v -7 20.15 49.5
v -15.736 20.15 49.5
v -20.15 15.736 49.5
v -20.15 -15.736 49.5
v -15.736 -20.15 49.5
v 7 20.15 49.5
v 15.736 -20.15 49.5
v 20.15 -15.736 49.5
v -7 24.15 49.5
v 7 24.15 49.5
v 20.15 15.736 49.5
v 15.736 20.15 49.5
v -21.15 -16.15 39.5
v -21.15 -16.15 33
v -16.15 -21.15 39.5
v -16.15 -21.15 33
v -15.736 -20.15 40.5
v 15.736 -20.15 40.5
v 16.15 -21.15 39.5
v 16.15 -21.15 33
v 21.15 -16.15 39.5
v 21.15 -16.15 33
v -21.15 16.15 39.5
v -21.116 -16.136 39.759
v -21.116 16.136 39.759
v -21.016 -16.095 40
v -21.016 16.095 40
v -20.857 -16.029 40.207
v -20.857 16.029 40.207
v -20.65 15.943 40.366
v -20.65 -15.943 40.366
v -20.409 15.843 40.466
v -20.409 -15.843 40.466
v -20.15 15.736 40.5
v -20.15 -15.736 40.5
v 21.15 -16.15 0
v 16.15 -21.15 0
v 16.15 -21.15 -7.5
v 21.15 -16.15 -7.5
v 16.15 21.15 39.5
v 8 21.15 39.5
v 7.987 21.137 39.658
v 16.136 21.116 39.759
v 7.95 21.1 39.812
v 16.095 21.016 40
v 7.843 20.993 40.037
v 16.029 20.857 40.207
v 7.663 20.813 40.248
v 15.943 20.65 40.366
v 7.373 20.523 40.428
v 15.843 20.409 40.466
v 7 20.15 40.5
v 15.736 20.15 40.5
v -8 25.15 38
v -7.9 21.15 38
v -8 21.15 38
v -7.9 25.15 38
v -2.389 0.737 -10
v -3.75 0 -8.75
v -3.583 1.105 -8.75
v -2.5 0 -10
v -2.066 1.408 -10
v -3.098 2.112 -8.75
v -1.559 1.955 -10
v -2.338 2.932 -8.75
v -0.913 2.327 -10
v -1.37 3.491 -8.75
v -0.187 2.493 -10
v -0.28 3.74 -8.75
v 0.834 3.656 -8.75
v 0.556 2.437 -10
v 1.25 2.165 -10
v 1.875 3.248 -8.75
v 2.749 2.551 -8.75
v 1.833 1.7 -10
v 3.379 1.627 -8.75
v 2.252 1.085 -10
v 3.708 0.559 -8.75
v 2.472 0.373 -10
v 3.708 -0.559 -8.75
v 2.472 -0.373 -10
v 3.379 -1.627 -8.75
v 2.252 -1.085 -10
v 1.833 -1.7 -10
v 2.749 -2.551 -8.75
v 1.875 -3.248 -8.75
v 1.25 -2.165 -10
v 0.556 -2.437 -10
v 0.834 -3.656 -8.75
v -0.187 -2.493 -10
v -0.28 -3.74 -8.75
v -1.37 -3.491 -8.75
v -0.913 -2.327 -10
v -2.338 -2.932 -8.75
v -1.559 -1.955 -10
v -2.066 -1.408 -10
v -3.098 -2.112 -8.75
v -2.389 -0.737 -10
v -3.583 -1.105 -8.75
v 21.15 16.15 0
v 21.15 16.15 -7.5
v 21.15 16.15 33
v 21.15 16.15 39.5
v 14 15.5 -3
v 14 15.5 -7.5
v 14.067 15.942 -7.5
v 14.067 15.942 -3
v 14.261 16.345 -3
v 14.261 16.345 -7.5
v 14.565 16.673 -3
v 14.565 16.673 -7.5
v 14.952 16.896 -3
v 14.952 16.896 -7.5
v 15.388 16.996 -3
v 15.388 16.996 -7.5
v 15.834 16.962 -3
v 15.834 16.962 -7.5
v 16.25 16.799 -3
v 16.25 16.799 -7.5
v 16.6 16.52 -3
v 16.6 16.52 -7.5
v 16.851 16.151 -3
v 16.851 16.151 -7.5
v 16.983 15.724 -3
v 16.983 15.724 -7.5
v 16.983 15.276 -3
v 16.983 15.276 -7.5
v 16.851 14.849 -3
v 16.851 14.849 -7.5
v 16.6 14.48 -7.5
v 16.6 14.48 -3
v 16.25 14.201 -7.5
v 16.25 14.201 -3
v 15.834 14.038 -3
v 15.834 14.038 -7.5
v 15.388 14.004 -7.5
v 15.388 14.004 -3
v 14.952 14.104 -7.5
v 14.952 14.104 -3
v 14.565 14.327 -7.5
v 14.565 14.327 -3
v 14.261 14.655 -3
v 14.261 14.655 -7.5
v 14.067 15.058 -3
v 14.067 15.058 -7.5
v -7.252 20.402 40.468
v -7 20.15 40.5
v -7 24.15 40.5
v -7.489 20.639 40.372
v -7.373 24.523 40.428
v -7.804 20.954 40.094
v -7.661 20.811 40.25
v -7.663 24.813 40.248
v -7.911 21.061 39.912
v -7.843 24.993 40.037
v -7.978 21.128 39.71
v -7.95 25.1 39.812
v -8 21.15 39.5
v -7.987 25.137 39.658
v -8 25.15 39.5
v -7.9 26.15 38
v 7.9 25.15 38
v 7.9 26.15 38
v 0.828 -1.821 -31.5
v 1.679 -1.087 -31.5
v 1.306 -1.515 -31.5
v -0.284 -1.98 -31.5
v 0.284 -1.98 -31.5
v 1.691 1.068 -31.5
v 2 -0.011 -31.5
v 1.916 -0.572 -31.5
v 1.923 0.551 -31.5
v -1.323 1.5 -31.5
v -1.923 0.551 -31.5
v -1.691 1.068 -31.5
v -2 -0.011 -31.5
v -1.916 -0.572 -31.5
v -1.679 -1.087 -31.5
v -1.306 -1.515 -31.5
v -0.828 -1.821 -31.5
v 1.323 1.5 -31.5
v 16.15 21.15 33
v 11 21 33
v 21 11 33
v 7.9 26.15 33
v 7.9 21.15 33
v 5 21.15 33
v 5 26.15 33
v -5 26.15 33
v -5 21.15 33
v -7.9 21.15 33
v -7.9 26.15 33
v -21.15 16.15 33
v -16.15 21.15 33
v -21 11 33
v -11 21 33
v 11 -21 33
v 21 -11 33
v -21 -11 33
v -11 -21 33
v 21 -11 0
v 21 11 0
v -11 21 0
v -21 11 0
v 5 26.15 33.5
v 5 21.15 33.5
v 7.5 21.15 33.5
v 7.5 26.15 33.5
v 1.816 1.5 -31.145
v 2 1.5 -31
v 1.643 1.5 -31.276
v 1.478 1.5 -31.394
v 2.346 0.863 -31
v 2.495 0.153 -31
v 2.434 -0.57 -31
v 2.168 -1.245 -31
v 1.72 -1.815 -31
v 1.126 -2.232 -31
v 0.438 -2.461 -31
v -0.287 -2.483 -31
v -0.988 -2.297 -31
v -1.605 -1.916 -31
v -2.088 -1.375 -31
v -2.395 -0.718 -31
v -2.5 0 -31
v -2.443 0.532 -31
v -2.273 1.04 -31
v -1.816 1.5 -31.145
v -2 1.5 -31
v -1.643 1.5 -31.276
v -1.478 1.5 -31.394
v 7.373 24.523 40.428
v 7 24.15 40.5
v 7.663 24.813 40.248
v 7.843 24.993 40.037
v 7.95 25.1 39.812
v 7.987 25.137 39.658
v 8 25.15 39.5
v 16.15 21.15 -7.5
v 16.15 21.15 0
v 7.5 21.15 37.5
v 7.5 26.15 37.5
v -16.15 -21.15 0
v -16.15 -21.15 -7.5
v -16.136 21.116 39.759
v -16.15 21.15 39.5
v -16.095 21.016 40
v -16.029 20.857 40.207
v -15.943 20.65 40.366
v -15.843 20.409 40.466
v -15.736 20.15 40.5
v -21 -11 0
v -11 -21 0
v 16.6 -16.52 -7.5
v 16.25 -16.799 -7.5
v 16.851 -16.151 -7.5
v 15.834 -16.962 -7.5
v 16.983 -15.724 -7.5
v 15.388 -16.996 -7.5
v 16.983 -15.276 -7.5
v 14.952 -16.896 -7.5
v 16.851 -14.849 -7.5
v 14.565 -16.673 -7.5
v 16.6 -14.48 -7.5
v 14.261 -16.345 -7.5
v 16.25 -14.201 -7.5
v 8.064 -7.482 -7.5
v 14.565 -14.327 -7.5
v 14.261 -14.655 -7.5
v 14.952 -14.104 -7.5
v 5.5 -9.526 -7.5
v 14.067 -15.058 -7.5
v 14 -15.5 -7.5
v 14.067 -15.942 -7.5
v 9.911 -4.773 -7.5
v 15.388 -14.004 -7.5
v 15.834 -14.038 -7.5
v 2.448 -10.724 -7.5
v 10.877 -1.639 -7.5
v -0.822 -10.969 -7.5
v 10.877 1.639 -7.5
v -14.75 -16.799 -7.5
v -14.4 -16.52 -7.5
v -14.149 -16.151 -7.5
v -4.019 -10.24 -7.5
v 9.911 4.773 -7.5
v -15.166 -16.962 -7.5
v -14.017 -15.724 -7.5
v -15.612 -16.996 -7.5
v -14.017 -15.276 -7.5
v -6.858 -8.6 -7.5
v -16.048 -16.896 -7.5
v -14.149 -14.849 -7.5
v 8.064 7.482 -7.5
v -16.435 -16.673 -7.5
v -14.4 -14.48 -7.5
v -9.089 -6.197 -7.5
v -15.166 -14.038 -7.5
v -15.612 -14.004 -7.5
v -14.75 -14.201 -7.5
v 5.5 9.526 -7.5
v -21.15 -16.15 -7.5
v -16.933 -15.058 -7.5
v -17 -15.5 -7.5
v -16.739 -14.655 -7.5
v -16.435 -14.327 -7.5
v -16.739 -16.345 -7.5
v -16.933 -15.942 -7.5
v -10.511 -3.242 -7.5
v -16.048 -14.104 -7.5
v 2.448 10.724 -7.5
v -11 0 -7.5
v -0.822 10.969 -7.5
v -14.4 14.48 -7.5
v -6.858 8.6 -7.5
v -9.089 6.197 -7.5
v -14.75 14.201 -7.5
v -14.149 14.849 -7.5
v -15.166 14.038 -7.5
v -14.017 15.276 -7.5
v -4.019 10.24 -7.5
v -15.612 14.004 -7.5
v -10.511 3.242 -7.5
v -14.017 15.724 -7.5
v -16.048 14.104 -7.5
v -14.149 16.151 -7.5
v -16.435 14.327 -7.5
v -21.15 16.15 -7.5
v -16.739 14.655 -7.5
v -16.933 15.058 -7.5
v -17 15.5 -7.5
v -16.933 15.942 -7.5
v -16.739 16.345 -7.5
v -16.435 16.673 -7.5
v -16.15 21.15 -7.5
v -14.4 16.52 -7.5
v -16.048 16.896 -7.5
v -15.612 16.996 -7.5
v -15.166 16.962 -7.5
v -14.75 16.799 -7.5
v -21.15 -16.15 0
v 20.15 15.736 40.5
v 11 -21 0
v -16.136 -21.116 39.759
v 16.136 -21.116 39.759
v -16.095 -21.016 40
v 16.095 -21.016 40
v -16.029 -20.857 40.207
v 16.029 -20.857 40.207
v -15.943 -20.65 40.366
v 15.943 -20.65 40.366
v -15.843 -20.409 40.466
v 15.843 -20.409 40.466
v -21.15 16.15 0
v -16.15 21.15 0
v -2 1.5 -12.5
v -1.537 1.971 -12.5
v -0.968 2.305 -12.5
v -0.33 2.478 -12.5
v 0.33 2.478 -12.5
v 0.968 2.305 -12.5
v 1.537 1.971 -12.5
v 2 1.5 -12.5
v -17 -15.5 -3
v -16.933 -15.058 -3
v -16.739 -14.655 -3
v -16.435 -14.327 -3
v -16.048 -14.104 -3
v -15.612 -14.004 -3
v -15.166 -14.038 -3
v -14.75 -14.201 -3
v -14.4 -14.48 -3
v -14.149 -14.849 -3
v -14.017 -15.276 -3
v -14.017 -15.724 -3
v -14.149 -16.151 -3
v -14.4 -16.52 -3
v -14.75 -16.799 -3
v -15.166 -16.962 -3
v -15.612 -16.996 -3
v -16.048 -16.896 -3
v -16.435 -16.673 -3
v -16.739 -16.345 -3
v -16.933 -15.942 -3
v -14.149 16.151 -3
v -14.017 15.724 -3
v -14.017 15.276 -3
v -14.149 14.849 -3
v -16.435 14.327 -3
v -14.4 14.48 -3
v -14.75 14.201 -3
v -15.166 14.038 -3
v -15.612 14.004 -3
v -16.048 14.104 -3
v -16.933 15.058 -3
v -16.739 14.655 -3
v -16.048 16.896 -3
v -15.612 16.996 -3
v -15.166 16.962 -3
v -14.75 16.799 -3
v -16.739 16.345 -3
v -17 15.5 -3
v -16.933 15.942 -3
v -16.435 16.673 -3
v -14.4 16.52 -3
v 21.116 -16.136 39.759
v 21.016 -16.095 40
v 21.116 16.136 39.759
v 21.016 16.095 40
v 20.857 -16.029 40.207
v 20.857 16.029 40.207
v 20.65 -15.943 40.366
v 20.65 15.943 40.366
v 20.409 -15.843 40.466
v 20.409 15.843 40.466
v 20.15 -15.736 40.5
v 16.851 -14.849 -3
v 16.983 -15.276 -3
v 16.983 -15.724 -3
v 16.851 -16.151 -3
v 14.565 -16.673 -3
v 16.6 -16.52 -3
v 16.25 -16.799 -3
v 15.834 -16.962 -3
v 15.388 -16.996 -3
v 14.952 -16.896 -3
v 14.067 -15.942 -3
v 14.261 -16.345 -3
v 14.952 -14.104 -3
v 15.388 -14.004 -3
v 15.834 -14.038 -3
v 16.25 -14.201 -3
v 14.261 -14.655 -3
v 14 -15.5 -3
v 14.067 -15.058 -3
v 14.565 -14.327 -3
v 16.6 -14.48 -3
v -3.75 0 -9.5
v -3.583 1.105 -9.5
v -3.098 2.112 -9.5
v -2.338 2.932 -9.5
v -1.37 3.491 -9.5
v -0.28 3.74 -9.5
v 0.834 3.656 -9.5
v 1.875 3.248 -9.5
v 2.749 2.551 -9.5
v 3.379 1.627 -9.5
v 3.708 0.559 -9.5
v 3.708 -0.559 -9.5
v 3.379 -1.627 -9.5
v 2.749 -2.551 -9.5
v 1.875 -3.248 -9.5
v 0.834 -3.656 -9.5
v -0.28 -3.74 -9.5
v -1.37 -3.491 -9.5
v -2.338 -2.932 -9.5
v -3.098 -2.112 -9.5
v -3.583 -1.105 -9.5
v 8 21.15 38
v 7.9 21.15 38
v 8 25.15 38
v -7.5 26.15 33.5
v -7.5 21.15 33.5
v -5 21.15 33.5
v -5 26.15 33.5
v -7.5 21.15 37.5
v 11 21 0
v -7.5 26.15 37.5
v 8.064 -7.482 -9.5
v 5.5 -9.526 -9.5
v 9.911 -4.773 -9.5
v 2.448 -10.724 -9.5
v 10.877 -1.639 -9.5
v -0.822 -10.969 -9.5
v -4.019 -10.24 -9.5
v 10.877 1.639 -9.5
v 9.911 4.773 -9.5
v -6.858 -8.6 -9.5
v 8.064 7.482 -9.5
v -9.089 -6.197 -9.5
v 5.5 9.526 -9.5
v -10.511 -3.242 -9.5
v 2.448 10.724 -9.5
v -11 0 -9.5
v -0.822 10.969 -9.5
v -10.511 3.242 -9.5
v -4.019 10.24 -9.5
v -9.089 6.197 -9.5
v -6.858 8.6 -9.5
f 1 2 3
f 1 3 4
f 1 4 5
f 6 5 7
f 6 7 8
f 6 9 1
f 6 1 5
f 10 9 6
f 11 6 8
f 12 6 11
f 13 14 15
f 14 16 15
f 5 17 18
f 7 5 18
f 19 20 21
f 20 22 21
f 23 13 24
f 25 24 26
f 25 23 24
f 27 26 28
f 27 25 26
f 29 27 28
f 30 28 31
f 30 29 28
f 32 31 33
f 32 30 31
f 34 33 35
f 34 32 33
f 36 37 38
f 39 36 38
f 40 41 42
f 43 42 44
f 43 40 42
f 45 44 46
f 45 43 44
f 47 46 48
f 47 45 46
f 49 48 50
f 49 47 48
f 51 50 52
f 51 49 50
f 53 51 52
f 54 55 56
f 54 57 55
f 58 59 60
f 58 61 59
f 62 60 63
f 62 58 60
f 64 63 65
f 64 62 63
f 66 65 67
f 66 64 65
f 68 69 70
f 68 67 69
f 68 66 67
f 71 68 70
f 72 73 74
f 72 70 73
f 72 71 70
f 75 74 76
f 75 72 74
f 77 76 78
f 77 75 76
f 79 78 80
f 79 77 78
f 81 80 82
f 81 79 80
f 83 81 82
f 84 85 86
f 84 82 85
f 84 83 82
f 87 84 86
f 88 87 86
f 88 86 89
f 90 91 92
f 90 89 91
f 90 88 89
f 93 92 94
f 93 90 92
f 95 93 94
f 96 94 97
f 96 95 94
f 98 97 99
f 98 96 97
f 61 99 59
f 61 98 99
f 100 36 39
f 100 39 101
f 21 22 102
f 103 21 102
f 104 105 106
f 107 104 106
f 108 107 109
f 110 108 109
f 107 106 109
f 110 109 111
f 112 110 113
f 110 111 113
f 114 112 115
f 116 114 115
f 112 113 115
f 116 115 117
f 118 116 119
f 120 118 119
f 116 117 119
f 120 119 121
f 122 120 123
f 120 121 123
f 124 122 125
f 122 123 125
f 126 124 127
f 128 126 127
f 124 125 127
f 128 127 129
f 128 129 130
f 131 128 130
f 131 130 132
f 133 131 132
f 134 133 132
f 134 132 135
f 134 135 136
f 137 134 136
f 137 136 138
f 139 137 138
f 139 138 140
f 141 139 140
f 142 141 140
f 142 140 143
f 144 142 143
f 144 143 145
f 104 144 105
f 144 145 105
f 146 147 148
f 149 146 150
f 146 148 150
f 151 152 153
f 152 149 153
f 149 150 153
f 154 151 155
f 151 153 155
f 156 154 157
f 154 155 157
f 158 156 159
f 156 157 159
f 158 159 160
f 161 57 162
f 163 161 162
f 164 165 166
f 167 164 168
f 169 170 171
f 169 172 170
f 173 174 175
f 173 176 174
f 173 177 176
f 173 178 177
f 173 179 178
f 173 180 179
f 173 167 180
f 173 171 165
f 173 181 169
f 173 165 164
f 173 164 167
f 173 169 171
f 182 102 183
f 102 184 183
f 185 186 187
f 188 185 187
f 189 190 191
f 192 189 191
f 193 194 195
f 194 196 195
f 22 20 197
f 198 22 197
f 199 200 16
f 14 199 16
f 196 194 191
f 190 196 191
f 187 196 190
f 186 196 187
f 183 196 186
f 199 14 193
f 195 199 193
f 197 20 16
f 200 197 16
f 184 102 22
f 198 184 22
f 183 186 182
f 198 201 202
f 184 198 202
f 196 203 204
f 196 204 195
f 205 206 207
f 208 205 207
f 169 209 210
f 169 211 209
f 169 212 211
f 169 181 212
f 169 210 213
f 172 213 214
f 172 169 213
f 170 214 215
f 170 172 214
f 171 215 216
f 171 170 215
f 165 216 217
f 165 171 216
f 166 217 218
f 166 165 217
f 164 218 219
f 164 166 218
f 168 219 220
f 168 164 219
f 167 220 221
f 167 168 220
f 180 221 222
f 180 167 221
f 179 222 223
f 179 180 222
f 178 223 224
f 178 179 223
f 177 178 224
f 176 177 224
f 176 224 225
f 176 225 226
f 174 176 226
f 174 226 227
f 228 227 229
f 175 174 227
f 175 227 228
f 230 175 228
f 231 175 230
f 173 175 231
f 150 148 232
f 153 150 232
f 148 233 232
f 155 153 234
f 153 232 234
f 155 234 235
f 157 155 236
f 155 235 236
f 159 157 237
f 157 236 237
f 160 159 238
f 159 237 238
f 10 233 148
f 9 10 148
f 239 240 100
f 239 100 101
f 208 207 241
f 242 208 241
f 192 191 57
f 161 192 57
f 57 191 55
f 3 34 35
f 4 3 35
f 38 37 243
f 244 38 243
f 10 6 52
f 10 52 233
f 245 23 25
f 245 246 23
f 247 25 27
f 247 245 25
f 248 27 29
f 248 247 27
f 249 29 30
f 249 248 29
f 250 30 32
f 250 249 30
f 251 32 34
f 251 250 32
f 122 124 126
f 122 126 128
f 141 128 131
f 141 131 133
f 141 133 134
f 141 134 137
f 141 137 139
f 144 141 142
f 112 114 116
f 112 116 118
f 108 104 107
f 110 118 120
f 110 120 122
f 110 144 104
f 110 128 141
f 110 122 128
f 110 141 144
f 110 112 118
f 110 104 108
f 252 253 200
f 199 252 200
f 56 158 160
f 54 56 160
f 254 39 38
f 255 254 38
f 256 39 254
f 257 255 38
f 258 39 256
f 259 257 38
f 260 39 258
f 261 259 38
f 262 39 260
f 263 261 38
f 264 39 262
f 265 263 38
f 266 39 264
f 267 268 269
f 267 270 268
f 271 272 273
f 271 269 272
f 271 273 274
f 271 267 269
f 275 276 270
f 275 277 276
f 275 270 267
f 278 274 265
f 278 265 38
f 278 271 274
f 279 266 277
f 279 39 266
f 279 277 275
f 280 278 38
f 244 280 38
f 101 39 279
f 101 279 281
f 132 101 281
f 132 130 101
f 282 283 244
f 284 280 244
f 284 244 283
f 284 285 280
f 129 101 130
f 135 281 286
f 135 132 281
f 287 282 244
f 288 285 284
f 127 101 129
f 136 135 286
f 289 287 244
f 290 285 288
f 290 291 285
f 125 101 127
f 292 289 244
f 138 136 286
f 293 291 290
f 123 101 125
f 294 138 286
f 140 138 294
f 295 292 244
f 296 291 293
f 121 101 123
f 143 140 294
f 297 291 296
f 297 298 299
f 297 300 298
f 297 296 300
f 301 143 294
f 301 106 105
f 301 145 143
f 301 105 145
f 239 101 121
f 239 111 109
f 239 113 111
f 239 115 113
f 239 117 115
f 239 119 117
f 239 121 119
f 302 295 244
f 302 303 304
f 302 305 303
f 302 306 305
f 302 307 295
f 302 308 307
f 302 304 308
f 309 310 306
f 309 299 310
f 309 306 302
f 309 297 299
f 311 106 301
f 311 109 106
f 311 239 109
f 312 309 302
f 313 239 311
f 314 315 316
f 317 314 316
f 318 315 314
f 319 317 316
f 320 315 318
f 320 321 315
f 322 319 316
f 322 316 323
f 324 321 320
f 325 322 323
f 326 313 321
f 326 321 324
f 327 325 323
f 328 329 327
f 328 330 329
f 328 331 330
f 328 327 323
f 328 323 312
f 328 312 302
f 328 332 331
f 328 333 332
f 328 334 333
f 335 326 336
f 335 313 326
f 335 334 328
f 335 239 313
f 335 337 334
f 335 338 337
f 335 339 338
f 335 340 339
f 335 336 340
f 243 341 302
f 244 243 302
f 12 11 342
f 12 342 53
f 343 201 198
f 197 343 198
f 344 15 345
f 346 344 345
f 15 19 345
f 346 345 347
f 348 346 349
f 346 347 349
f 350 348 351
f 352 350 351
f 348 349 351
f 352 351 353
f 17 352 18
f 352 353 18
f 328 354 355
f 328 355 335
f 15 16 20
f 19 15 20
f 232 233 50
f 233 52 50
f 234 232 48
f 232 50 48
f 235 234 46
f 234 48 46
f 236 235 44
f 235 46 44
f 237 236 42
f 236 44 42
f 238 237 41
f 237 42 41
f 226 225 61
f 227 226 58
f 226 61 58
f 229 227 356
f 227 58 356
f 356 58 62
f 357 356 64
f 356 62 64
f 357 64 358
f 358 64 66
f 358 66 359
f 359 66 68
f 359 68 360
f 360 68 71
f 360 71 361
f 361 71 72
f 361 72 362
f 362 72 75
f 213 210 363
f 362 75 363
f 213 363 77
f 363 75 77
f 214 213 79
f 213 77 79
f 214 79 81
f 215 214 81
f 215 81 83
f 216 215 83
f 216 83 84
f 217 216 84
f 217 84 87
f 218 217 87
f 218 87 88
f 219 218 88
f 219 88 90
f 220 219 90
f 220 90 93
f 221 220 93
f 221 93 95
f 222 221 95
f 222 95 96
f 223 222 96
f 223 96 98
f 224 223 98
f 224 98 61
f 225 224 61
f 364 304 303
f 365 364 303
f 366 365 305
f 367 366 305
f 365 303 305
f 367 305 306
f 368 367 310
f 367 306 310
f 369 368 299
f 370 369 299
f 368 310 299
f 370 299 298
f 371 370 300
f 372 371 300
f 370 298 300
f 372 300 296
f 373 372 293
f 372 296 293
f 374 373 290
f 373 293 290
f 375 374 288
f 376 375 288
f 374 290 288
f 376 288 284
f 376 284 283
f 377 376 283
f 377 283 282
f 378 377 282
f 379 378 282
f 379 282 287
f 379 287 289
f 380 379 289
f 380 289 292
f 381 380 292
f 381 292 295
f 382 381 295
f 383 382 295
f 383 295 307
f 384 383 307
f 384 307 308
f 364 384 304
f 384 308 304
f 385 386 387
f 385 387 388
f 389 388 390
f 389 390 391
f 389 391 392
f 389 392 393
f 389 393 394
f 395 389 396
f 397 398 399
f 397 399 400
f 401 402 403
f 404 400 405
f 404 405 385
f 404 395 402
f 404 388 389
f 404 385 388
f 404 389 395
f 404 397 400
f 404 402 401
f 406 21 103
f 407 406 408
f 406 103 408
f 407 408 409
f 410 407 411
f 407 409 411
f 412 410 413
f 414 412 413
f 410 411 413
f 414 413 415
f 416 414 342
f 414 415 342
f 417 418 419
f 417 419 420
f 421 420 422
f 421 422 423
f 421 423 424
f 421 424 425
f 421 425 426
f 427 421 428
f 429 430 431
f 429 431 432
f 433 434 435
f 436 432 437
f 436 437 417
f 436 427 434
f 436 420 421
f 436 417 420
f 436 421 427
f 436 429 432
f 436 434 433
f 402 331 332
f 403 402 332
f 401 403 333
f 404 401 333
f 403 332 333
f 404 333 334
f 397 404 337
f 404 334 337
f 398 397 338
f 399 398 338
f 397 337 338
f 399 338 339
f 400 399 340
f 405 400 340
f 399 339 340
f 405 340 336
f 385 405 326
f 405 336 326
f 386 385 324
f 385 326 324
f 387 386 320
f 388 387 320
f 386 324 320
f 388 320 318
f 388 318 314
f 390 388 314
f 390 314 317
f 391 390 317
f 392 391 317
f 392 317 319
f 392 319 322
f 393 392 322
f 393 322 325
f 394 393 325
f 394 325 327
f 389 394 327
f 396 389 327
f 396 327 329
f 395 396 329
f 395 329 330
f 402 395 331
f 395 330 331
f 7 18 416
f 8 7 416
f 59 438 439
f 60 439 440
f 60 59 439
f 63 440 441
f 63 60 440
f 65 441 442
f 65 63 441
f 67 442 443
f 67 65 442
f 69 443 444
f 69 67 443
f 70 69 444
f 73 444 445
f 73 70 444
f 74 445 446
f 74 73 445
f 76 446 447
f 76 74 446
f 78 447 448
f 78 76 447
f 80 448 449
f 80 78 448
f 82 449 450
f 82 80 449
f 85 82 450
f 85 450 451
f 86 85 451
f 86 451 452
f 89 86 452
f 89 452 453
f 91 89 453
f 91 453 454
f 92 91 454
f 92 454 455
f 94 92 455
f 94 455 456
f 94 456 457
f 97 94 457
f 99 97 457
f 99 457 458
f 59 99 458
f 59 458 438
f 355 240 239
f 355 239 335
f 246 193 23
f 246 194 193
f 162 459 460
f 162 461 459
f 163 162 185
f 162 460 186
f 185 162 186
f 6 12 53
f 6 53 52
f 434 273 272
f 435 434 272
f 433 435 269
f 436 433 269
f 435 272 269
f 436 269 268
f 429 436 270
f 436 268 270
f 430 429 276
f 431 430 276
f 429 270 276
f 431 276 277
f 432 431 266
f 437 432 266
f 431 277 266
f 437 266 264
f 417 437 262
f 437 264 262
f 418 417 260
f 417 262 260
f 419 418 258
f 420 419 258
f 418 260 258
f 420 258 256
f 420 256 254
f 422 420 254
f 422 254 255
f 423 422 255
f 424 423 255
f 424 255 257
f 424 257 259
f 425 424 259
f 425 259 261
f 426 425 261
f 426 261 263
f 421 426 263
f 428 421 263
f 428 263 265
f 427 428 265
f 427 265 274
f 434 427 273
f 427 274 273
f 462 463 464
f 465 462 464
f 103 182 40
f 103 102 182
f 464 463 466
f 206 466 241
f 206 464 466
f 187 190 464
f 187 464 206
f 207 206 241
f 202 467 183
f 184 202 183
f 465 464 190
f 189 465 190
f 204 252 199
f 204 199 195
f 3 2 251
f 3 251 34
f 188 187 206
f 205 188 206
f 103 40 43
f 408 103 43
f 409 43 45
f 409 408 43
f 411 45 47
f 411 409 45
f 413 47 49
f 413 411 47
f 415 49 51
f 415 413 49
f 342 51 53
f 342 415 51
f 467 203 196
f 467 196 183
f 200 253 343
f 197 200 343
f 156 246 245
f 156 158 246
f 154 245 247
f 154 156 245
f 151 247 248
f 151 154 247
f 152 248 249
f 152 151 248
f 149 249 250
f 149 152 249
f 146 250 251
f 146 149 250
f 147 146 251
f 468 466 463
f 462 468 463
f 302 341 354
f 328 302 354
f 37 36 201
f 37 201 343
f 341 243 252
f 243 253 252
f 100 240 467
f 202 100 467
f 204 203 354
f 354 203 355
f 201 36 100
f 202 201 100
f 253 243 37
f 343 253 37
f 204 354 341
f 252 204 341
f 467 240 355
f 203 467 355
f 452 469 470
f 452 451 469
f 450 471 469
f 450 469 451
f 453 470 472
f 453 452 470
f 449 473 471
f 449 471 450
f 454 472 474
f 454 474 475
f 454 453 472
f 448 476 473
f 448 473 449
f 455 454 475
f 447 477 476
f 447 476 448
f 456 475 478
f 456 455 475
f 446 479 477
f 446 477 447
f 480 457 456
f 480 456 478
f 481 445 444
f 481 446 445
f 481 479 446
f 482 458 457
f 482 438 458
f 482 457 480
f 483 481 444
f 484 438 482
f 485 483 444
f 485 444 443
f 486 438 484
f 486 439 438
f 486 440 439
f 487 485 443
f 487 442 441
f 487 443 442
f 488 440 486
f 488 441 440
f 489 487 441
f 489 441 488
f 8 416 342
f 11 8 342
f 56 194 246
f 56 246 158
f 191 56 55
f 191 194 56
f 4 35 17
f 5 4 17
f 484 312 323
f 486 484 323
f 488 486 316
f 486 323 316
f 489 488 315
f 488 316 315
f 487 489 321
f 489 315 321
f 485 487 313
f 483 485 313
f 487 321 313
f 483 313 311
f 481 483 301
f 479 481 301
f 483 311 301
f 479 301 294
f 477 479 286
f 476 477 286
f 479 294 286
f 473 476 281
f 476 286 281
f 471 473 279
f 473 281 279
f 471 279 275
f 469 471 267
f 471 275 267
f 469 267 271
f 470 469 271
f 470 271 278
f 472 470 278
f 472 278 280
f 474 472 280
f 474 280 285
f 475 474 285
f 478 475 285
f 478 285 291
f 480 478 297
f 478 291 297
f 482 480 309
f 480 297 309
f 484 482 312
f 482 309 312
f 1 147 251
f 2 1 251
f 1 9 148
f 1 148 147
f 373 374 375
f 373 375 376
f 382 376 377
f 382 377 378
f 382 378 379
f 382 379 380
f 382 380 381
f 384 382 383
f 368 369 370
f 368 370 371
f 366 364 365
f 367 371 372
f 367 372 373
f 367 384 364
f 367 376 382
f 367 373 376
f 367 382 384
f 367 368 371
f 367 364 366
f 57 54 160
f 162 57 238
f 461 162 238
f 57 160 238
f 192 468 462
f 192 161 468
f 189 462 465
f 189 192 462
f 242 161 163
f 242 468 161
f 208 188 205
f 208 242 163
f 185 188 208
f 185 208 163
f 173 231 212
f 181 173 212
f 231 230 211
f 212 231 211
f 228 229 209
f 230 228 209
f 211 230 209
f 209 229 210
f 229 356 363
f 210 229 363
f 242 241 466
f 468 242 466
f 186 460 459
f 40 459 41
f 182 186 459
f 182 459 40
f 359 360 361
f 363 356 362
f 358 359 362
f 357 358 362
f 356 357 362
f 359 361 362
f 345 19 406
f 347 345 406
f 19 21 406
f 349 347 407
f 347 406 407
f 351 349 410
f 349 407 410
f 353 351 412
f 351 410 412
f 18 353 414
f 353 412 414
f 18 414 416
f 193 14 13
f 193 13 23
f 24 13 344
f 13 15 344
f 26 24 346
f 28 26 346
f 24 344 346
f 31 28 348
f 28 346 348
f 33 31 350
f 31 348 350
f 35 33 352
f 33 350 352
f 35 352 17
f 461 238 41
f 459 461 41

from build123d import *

# Parameters (mm, degrees)
SKETCH_1_W          = 42
SKETCH_1_H          = 42
EXTRUDE_1_DEPTH     = 33
CHAMFER_1_SIZE      = 10
SKETCH_2_W          = 42.3
SKETCH_2_H          = 42.3
EXTRUDE_2_DEPTH     = 7.5
SKETCH_3_W          = 42.3
SKETCH_3_H          = 42.3
EXTRUDE_3_DEPTH     = 7.5
CHAMFER_2_SIZE      = 5
SKETCH_4_R          = 1.5
CUT_EXTRUDE_1_DEPTH = 4.5
SKETCH_5_R          = 11
SKETCH_5_R_2        = 3.75
EXTRUDE_4_DEPTH     = 2
SKETCH_6_R          = 2.5
EXTRUDE_5_DEPTH     = 24
CUT_EXTRUDE_START   = -19
CUT_EXTRUDE_2_DEPTH = 19
CHAMFER_3_SIZE      = 0.5
EXTRUDE_6_DEPTH     = 2.5
FILLET_1_R          = 1
EXTRUDE_7_DEPTH     = 5
EXTRUDE_8_DEPTH     = 9
CHAMFER_4_SIZE      = 2.5


with BuildPart() as part:
    # 草图1 → 凸台-拉伸1 (new body)
    with BuildSketch(Plane.XY):
        Rectangle(SKETCH_1_W, SKETCH_1_H)
    extrude(amount=EXTRUDE_1_DEPTH)

    # 倒角1
    chamfer_1_edges = [part.edges().sort_by_distance(p)[0] for p in [
        (21, -21, 16.5),
        (-21, -21, 16.5),
        (-21, 21, 16.5),
        (21, 21, 16.5),
    ]]
    chamfer(chamfer_1_edges, length=CHAMFER_1_SIZE)

    # 草图2 → 凸台-拉伸2 (add)
    with BuildSketch(Plane.XY.offset(33)):
        Rectangle(SKETCH_2_W, SKETCH_2_H)
    extrude(amount=EXTRUDE_2_DEPTH)

    # 草图3 → 凸台-拉伸3 (add)
    with BuildSketch(Plane(origin=(0, 0, 0), x_dir=(-1, 0, 0), z_dir=(0, 0, -1))):
        Rectangle(SKETCH_3_W, SKETCH_3_H)
    extrude(amount=EXTRUDE_3_DEPTH)

    # 倒角2
    chamfer_2_edges = [part.edges().sort_by_distance(p)[0] for p in [
        (21.15, -21.15, 36.75),
        (21.15, 21.15, 36.75),
        (-21.15, 21.15, 36.75),
        (-21.15, -21.15, 36.75),
        (-21.15, -21.15, -3.75),
        (-21.15, 21.15, -3.75),
        (21.15, 21.15, -3.75),
        (21.15, -21.15, -3.75),
    ]]
    chamfer(chamfer_2_edges, length=CHAMFER_2_SIZE)

    # 草图4 → 切除-拉伸1 (cut)
    with BuildSketch(Plane(origin=(0, 0, -7.5), x_dir=(-1, 0, 0), z_dir=(0, 0, -1))):
        with Locations((-15.5, 15.5)):
            Circle(SKETCH_4_R)
        with Locations((15.5, 15.5)):
            Circle(SKETCH_4_R)
        with Locations((15.5, -15.5)):
            Circle(SKETCH_4_R)
        with Locations((-15.5, -15.5)):
            Circle(SKETCH_4_R)
    extrude(amount=-CUT_EXTRUDE_1_DEPTH, mode=Mode.SUBTRACT)

    # 草图5 → 凸台-拉伸4 (add)
    with BuildSketch(Plane(origin=(0, 0, -7.5), x_dir=(-1, 0, 0), z_dir=(0, 0, -1))):
        Circle(SKETCH_5_R)
        Circle(SKETCH_5_R_2, mode=Mode.SUBTRACT)
    extrude(amount=EXTRUDE_4_DEPTH)

    # 草图6 → 凸台-拉伸5 (add)
    with BuildSketch(Plane(origin=(0, 0, -7.5), x_dir=(-1, 0, 0), z_dir=(0, 0, -1))):
        Circle(SKETCH_6_R)
    extrude(amount=EXTRUDE_5_DEPTH)

    # 草图7 → 切除-拉伸2 (cut)
    with BuildSketch(Plane(origin=(0, 0, -31.5), x_dir=(-1, 0, 0), z_dir=(0, 0, -1)).offset(CUT_EXTRUDE_START)):
        with BuildLine():
            Line((2, 1.5), (-2, 1.5))
            ThreePointArc((-2, 1.5), (0, 2.5), (2, 1.5))
        make_face()
    extrude(amount=CUT_EXTRUDE_2_DEPTH, mode=Mode.SUBTRACT)

    # 倒角3
    chamfer_3_edges = [part.edges().sort_by_distance(p)[0] for p in [
        (0.790569415, -2.371708245, -31.5),
    ]]
    chamfer(chamfer_3_edges, length=CHAMFER_3_SIZE)

    # 草图8 → 凸台-拉伸6 (add)
    with BuildSketch(Plane.XY.offset(40.5)):
        Polygon((0, 21.15), (-8, 21.15), (-8, 25.15), (8, 25.15), (8, 21.15), align=None)
    extrude(amount=-EXTRUDE_6_DEPTH)

    # 圆角1
    fillet_1_edges = [part.edges().sort_by_distance(p)[0] for p in [
        (-12.075, 21.15, 40.5),
        (8, 23.15, 40.5),
        (0, 25.15, 40.5),
        (-8, 23.15, 40.5),
        (0, -21.15, 40.5),
        (-21.15, 0, 40.5),
        (21.15, 0, 40.5),
        (12.075, 21.15, 40.5),
        (-18.65, 18.65, 40.5),
        (18.65, 18.65, 40.5),
        (18.65, -18.65, 40.5),
        (-18.65, -18.65, 40.5),
    ]]
    fillet(fillet_1_edges, radius=FILLET_1_R)

    # 草图9 → 凸台-拉伸7 (add)
    with BuildSketch(Plane(origin=(0, 21.15, 0), x_dir=(1, 0, 0), z_dir=(0, 1, 0))):
        Polygon((7.9, -33), (5, -33), (5, -33.5), (7.5, -33.5), (7.5, -37.5), (-7.5, -37.5), (-7.5, -33.5), (-5, -33.5), (-5, -33), (-7.9, -33), (-7.9, -38), (7.9, -38), align=None)
    extrude(amount=EXTRUDE_7_DEPTH)

    # 草图10 → 凸台-拉伸8 (add)
    with BuildSketch(Plane.XY.offset(40.5)):
        Polygon((-7, 20.15), (-15.735786438, 20.15), (-20.15, 15.735786438), (-20.15, -15.735786438), (-15.735786438, -20.15), (15.735786438, -20.15), (20.15, -15.735786438), (20.15, 15.735786438), (15.735786438, 20.15), (7, 20.15), (7, 24.15), (-7, 24.15), align=None)
    extrude(amount=EXTRUDE_8_DEPTH)

    # 倒角4
    # the kernel refuses this chamfer: 2.5 mm, written as the material it adds along each edge
    with BuildSketch(Plane(origin=(0, 0, -7.5), x_dir=(-1, 0, 0), z_dir=(0, -1, 0))) as chamfer_4_piece_1:
        Polygon((2.5 + CHAMFER_4_SIZE, 0), (2.5, CHAMFER_4_SIZE), (2.5, 0), align=None)
    revolve(axis=Axis((0, 0, -7.5), (0, 0, -1)))


solid = part.part
